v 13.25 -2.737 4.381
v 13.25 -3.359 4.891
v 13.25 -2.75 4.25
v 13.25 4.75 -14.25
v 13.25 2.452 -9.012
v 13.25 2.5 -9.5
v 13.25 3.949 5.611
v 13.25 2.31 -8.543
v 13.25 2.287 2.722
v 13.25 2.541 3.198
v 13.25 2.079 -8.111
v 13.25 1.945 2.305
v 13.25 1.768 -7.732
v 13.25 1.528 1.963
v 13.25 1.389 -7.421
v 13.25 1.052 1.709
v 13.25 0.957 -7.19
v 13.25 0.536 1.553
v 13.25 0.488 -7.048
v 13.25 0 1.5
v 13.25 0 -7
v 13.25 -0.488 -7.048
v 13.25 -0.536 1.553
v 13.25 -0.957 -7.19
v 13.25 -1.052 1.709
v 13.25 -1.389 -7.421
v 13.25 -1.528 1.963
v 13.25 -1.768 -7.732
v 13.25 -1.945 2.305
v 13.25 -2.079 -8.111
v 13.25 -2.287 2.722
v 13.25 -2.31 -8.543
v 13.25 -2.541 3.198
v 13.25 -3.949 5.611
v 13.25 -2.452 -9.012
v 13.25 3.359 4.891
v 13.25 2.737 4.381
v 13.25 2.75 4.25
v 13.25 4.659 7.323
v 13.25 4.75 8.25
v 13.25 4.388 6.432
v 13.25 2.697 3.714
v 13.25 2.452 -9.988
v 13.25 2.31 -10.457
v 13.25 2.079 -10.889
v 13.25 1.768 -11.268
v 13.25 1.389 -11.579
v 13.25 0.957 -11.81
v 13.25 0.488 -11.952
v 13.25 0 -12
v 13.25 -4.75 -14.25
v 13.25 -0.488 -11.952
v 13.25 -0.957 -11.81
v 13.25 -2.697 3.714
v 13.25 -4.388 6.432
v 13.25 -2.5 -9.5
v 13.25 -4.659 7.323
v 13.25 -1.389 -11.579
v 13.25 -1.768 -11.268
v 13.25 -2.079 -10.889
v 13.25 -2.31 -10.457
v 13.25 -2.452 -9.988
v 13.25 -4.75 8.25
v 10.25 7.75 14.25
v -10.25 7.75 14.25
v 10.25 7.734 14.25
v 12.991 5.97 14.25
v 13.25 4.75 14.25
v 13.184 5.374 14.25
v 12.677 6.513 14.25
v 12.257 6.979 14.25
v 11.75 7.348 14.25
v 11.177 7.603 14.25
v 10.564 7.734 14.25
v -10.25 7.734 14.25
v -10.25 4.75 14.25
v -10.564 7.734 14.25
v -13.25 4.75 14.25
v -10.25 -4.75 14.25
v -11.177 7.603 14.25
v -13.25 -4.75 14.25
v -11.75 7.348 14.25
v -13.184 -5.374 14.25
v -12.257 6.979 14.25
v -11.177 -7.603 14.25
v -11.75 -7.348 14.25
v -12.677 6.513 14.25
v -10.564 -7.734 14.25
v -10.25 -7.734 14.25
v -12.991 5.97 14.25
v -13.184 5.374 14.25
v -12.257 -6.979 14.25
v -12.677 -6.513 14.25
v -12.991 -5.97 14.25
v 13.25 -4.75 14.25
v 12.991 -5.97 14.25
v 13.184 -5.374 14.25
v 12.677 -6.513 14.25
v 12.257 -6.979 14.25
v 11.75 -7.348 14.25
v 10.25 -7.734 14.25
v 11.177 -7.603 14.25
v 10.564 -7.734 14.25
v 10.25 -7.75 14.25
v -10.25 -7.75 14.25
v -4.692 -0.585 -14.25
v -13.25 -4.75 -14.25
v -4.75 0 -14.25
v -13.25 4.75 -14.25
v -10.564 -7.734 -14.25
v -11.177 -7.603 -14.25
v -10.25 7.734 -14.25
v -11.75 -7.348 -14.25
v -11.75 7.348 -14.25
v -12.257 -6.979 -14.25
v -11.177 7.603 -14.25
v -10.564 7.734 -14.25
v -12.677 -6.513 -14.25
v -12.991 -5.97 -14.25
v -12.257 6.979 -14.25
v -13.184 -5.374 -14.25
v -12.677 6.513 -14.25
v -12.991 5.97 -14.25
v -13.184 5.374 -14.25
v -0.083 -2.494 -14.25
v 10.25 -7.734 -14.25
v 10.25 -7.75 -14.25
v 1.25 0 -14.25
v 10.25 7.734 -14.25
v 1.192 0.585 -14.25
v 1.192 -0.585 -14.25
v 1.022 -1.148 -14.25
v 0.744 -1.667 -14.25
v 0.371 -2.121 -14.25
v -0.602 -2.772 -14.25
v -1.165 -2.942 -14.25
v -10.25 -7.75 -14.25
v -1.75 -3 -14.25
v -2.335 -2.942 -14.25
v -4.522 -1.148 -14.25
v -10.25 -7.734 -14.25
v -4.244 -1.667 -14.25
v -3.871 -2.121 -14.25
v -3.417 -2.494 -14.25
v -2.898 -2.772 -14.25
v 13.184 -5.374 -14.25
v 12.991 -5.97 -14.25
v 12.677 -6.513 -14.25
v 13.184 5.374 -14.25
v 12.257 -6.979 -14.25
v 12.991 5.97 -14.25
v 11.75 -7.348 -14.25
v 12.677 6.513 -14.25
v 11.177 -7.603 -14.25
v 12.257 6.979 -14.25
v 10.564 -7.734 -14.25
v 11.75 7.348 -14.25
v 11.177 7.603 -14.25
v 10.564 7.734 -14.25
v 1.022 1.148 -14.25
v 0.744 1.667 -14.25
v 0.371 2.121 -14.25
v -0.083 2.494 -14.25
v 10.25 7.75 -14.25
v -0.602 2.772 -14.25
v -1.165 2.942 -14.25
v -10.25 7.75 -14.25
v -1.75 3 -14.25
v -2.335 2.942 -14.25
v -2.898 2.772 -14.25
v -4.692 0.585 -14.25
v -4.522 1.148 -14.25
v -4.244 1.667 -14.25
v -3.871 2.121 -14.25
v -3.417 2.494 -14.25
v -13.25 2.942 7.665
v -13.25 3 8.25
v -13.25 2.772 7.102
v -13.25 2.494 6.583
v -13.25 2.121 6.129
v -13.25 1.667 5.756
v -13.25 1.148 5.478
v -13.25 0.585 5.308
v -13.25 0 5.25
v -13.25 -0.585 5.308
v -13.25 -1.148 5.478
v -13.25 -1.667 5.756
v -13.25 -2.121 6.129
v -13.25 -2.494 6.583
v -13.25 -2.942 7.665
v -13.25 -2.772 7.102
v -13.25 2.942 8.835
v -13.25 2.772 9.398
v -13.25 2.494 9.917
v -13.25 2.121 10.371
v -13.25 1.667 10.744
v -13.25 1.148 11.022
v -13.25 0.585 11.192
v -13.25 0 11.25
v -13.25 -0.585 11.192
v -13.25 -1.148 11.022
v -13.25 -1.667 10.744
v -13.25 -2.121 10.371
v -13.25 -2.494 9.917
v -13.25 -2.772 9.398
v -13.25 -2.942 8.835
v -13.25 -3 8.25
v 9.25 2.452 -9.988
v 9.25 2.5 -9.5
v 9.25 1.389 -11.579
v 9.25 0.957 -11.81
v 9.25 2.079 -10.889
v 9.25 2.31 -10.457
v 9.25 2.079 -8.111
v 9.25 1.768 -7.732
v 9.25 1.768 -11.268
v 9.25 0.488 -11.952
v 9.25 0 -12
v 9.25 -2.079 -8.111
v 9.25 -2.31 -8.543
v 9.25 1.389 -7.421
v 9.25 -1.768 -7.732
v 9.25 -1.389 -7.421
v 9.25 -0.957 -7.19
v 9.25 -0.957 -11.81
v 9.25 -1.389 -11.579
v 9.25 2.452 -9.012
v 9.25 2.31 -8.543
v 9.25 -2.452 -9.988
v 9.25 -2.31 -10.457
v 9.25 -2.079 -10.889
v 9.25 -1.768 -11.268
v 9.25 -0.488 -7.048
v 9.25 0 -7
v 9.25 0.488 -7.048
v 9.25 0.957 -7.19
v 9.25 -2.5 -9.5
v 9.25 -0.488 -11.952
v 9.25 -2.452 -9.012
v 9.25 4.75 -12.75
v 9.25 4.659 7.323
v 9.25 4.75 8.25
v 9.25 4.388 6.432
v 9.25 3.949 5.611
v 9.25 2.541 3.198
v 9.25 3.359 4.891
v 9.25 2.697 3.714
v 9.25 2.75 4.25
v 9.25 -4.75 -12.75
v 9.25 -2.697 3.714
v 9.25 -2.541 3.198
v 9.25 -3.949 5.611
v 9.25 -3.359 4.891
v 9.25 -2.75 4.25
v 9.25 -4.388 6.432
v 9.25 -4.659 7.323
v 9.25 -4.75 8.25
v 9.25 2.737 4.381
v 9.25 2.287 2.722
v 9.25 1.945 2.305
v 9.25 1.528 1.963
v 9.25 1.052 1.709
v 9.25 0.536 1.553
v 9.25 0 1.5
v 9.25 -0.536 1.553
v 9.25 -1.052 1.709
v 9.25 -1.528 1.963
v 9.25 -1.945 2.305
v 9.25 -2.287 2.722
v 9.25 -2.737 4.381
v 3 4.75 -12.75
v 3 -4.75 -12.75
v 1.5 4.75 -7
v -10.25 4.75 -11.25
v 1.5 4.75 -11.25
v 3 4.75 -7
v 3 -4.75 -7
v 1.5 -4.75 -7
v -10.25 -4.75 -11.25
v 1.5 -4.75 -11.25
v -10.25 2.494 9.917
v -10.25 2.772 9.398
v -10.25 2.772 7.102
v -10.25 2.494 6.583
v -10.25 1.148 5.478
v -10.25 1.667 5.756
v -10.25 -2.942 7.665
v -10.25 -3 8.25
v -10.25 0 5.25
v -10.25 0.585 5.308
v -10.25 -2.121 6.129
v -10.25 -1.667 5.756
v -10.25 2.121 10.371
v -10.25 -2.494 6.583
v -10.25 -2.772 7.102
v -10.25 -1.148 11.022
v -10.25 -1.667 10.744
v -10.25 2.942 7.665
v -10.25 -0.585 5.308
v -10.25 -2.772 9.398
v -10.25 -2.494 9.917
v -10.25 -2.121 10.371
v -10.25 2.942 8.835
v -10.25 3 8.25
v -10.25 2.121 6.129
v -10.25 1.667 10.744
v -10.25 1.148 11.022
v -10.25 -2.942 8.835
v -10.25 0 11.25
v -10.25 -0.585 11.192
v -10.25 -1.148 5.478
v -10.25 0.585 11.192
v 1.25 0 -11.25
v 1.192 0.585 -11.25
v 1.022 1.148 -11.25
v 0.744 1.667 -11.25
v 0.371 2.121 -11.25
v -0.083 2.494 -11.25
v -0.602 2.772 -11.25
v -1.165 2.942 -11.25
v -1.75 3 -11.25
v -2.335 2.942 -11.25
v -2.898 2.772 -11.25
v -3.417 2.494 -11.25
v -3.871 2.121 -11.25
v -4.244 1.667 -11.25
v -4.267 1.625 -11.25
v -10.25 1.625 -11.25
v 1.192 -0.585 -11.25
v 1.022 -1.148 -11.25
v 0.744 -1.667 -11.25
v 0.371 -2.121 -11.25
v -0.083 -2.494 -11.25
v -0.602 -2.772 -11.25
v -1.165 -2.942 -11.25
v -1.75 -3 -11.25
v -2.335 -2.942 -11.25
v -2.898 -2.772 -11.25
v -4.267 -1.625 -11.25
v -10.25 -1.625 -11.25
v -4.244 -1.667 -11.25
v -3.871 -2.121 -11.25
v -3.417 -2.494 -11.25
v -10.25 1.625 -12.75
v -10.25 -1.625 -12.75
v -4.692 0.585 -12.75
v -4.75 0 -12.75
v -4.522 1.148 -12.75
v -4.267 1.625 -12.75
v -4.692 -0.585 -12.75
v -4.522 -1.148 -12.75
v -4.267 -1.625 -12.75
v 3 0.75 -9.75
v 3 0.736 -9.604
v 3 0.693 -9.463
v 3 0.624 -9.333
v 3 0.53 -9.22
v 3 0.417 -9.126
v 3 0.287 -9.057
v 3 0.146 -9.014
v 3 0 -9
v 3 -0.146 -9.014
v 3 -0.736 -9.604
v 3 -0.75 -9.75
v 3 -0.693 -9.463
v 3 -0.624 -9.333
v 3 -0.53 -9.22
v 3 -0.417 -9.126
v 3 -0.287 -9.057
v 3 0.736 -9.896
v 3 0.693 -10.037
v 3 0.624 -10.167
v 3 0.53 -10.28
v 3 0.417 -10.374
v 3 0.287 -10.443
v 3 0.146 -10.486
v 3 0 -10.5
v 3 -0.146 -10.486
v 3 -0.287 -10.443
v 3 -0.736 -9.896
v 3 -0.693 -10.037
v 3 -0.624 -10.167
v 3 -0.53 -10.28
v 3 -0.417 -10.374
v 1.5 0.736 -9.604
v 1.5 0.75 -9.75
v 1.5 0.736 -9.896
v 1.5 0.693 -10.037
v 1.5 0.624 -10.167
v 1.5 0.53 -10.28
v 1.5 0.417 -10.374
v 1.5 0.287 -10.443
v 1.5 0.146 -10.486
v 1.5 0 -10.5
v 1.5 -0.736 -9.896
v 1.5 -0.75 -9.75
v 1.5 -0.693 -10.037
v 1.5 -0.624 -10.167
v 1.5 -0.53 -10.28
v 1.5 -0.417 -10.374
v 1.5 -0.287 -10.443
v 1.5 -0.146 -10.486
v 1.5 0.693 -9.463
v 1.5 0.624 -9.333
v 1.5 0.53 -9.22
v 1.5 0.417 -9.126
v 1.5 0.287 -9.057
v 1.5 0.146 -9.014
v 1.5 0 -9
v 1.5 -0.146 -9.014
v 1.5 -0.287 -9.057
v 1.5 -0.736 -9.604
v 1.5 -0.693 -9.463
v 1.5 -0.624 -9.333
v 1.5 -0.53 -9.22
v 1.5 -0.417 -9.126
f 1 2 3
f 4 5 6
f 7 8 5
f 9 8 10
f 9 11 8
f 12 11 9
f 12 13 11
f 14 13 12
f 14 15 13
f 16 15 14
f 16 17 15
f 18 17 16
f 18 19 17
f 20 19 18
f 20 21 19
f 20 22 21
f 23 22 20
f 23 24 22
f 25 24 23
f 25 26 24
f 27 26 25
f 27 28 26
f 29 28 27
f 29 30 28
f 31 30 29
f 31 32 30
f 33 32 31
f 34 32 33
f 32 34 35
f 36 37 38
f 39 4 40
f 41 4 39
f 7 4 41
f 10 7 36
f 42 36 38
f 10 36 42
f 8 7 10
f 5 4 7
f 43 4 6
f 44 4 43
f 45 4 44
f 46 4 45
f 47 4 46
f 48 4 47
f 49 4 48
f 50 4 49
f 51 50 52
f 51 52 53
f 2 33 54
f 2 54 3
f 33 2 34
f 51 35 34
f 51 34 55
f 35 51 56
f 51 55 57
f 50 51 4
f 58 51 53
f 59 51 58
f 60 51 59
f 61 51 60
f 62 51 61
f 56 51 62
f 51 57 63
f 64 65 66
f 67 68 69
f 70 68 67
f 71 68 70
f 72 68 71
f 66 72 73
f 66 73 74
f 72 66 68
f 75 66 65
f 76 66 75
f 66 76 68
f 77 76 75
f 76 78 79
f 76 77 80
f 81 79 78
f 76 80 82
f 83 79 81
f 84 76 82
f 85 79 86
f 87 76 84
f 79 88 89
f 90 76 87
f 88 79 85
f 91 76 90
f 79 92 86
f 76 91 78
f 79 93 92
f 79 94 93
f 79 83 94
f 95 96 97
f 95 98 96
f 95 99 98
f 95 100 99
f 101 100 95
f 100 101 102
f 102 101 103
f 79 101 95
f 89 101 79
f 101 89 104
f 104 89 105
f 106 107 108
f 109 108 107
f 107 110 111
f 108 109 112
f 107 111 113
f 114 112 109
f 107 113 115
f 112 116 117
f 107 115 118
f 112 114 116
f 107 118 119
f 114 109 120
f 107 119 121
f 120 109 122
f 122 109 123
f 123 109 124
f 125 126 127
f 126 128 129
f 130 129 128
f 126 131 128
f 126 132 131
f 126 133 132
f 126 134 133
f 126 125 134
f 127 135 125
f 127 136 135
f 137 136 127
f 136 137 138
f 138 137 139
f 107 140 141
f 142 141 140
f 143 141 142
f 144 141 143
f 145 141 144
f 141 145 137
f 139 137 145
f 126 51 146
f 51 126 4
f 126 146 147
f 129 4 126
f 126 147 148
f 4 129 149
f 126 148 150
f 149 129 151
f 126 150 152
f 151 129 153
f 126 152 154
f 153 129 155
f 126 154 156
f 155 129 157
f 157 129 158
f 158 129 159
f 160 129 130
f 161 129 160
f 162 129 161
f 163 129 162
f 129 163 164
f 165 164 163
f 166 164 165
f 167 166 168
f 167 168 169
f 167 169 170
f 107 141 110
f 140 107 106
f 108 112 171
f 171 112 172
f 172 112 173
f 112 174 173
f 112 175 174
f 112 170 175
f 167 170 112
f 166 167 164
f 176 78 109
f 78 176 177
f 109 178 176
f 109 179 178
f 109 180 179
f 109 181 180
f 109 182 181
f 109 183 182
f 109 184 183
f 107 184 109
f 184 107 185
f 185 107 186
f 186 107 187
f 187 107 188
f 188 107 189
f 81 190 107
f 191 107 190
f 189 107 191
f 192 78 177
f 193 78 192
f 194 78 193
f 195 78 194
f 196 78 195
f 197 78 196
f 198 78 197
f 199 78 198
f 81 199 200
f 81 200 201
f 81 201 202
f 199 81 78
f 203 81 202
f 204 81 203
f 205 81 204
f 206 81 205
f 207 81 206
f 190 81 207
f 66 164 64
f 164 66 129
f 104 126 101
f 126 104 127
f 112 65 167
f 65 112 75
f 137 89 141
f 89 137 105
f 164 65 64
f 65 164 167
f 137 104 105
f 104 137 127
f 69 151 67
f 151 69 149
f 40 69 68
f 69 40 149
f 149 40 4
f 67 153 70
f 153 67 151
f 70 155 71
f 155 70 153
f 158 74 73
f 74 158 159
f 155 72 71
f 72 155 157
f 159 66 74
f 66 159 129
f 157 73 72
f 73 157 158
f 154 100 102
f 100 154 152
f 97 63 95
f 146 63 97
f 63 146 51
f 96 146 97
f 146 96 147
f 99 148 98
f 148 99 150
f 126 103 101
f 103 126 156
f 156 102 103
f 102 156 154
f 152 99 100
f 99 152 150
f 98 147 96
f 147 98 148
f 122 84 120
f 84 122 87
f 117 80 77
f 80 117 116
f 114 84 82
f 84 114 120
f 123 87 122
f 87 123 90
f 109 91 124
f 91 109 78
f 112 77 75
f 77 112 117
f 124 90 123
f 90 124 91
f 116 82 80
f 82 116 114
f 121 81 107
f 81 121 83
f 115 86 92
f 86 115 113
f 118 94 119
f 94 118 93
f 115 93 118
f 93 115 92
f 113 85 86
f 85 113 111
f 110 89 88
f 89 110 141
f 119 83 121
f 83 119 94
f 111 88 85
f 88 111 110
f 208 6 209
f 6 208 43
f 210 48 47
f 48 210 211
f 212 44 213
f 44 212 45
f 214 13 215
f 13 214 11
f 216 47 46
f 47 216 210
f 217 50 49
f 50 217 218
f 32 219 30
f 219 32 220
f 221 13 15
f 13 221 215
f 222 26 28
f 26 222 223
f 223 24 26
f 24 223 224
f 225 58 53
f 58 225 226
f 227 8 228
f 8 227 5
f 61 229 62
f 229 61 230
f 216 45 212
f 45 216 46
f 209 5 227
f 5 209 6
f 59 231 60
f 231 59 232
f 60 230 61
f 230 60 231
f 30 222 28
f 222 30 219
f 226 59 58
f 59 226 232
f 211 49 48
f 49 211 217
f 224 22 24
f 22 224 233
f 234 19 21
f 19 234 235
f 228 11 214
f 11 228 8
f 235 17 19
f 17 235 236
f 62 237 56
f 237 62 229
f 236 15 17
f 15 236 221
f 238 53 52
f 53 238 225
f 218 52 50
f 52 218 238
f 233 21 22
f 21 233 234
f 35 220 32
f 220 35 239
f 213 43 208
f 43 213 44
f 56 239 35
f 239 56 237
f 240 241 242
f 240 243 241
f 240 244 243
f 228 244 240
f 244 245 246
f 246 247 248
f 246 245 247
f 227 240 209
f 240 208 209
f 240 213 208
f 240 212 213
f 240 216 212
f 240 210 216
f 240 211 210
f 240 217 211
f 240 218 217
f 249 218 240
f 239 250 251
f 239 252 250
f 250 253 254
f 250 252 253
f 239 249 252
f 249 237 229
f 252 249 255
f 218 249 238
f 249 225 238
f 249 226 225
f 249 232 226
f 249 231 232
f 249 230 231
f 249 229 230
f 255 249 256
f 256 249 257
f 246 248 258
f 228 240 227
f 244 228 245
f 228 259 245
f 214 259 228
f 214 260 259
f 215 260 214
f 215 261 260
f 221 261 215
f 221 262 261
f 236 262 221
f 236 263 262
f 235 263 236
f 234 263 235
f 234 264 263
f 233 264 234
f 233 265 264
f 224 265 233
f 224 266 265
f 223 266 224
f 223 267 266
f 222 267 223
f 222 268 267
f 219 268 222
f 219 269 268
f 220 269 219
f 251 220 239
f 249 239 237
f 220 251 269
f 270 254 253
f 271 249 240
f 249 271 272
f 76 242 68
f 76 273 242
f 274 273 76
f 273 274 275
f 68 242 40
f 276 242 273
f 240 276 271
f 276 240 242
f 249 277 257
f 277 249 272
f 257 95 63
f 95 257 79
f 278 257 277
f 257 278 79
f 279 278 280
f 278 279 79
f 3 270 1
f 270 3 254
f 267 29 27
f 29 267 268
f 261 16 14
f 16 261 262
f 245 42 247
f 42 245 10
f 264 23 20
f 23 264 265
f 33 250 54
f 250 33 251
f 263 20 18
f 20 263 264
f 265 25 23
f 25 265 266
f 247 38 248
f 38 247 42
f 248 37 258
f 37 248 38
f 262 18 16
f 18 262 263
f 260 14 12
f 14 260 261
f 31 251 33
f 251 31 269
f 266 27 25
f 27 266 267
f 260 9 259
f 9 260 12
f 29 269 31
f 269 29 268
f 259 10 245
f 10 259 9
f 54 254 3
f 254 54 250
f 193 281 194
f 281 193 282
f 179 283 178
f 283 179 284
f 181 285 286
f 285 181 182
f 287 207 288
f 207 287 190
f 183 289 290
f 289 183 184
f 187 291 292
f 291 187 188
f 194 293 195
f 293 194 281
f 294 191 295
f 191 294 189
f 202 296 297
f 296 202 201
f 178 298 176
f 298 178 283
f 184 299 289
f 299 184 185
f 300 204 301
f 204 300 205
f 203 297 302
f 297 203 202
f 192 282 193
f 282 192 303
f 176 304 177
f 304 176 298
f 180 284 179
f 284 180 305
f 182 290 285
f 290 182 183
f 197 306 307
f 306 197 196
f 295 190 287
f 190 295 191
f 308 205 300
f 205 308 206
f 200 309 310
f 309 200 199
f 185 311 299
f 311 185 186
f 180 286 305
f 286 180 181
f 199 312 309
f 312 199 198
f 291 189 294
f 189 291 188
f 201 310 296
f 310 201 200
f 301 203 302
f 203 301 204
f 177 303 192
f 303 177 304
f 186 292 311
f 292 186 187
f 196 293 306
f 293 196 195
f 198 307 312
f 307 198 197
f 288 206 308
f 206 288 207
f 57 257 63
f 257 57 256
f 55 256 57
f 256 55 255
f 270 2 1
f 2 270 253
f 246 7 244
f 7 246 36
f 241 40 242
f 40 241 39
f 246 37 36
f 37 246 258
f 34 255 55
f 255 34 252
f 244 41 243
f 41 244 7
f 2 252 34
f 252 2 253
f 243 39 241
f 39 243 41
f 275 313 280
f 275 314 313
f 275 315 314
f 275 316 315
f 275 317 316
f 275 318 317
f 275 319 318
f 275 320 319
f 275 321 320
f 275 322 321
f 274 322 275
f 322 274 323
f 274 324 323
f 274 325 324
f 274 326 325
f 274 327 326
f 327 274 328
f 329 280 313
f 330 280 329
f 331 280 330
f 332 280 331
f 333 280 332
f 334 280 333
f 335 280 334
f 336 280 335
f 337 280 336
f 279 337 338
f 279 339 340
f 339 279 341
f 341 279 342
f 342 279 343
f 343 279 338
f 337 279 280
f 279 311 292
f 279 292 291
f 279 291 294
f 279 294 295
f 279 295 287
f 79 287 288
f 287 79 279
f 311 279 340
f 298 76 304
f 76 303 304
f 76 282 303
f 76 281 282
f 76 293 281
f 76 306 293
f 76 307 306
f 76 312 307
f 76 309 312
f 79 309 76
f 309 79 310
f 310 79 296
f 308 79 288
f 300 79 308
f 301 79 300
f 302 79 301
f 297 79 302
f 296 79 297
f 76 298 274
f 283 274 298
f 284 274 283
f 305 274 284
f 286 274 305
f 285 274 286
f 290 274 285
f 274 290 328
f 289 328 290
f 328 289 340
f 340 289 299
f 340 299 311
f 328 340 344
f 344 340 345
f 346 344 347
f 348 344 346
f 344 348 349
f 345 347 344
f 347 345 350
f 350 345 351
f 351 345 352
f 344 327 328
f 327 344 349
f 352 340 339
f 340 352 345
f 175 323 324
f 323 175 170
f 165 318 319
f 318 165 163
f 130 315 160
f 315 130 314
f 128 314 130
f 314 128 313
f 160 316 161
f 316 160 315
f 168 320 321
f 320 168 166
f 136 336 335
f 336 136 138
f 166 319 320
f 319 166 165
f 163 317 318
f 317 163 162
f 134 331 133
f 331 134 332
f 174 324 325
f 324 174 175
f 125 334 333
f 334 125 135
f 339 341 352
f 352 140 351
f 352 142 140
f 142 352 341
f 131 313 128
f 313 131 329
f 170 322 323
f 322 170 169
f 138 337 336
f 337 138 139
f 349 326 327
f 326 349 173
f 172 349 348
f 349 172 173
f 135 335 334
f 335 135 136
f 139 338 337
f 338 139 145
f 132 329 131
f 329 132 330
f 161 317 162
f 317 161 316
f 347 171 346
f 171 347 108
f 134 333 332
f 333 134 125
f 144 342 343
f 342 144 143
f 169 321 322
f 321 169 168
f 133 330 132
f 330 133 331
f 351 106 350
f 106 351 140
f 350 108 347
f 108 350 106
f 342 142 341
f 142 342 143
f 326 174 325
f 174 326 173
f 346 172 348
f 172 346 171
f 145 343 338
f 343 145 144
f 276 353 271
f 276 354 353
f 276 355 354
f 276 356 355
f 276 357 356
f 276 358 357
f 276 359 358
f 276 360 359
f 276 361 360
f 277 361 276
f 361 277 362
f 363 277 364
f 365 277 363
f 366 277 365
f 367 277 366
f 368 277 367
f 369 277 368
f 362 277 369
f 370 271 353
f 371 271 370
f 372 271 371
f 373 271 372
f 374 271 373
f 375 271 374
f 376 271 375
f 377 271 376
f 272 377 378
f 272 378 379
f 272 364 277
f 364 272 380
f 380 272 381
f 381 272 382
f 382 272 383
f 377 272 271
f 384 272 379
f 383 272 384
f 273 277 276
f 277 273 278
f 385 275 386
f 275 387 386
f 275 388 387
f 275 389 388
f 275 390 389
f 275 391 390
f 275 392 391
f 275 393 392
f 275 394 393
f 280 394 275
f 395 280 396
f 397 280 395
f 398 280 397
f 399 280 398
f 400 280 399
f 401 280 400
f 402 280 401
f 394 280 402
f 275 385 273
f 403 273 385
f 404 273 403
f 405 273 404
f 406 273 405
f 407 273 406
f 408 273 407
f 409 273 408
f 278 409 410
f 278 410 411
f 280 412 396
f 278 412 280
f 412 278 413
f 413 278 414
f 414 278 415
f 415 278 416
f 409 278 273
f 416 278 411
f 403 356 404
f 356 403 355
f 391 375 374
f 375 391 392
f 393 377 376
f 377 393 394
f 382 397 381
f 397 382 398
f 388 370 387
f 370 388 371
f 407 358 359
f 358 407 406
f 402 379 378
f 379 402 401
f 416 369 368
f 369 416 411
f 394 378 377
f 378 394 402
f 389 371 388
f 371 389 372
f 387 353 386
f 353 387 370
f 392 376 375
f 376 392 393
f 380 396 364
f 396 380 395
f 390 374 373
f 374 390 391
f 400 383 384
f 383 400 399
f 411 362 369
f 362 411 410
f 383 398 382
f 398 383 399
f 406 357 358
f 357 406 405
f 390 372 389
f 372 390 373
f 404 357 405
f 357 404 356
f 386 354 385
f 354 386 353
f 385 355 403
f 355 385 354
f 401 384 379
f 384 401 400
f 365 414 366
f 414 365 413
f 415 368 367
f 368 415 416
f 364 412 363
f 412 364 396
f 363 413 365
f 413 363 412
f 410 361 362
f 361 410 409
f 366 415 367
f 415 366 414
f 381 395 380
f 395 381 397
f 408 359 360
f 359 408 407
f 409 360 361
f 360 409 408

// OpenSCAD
/* 
 * Copyright (c) 2017 by Paul-Louis Ageneau
 *
 * This program is free software: you can redistribute it and/or modify
 * it under the terms of the GNU General Public License as published by
 * the Free Software Foundation, either version 3 of the License, or
 * (at your option) any later version.
 *
 * This program is distributed in the hope that it will be useful,
 * but WITHOUT ANY WARRANTY; without even the implied warranty of
 * MERCHANTABILITY or FITNESS FOR A PARTICULAR PURPOSE.  See the
 * GNU General Public License for more details.
 *
 * You should have received a copy of the GNU General Public License
 * along with this program.  If not, see <http://www.gnu.org/licenses/>.
 */

servo_height = 19 + 0.5;
servo_width  = 20 + 0.5;
servo_depth  =  9 + 0.5;
servo_side   =  6;
border = 3;
$fn = 32;

union() {
    difference() {
        rcube([servo_height, servo_depth, servo_width + servo_side] + [border*2+1, border*2, 2], border);
        translate([-0.5, 0, 2]) union() {
            cube([servo_height, servo_depth, servo_width + servo_side], center = true);
            translate([-servo_height/4, 0, 3-servo_width/2- 6]) cube([servo_height/2, 3.25, 3], center = true);
            translate([-1.25, 0, -servo_width/2]) cylinder(r = 3, h = 20, center = true);
            translate([0, 0, servo_width/2 - 4]) {
                translate([border+0.01, 0, servo_width/2]) cube([servo_height+border*2, servo_depth, servo_width], center = true);
                translate([servo_height/2, 0, -4]) rotate([0, 90, 0]) cylinder(r = 2.75, h = 10, center = true);
                translate([0, 0, 0]) rotate([0, 90, 0]) cylinder(r = 3, h = servo_height*2, center = true);
                translate([servo_height/2, 0, 0]) rotate([0, 90, 0]) cylinder(r = servo_depth/2, h = 10, center = true);
                translate([servo_height/2, 0, -18]) union() {
                    translate([0, 0, 0.25]) rotate([0, 90, 0]) cylinder(r = 2.5, h = 10, center = true);
                    translate([-3.75, 0, 0]) cube([7.5, servo_depth, servo_side], center = true);
                }
            }
        }
    }
    translate([servo_height/2-7.5, 0, 8 - 18]) difference() {
        cube([1.5, servo_depth, servo_side], center = true);
        translate([0, 0, 0.25]) rotate([0, 90, 0]) cylinder(r = 0.75, h = 10, center = true);
    }
}

module rcube(size, border) {
    union() {
        $fn = 30;
        cube(size = size - [0, border, 0]*2, center = true);
        cube(size = size - [border, 0, 0]*2, center = true);
        v = [size.x/2-border, size.y/2-border, size.z/2];
        translate([ v.x, v.y, 0]) cylinder(r = border, h = v.z*2, center = true);
        translate([ v.x,-v.y, 0]) cylinder(r = border, h = v.z*2, center = true);
        translate([-v.x, v.y, 0]) cylinder(r = border, h = v.z*2, center = true);
        translate([-v.x,-v.y, 0]) cylinder(r = border, h = v.z*2, center = true);
    }
}
